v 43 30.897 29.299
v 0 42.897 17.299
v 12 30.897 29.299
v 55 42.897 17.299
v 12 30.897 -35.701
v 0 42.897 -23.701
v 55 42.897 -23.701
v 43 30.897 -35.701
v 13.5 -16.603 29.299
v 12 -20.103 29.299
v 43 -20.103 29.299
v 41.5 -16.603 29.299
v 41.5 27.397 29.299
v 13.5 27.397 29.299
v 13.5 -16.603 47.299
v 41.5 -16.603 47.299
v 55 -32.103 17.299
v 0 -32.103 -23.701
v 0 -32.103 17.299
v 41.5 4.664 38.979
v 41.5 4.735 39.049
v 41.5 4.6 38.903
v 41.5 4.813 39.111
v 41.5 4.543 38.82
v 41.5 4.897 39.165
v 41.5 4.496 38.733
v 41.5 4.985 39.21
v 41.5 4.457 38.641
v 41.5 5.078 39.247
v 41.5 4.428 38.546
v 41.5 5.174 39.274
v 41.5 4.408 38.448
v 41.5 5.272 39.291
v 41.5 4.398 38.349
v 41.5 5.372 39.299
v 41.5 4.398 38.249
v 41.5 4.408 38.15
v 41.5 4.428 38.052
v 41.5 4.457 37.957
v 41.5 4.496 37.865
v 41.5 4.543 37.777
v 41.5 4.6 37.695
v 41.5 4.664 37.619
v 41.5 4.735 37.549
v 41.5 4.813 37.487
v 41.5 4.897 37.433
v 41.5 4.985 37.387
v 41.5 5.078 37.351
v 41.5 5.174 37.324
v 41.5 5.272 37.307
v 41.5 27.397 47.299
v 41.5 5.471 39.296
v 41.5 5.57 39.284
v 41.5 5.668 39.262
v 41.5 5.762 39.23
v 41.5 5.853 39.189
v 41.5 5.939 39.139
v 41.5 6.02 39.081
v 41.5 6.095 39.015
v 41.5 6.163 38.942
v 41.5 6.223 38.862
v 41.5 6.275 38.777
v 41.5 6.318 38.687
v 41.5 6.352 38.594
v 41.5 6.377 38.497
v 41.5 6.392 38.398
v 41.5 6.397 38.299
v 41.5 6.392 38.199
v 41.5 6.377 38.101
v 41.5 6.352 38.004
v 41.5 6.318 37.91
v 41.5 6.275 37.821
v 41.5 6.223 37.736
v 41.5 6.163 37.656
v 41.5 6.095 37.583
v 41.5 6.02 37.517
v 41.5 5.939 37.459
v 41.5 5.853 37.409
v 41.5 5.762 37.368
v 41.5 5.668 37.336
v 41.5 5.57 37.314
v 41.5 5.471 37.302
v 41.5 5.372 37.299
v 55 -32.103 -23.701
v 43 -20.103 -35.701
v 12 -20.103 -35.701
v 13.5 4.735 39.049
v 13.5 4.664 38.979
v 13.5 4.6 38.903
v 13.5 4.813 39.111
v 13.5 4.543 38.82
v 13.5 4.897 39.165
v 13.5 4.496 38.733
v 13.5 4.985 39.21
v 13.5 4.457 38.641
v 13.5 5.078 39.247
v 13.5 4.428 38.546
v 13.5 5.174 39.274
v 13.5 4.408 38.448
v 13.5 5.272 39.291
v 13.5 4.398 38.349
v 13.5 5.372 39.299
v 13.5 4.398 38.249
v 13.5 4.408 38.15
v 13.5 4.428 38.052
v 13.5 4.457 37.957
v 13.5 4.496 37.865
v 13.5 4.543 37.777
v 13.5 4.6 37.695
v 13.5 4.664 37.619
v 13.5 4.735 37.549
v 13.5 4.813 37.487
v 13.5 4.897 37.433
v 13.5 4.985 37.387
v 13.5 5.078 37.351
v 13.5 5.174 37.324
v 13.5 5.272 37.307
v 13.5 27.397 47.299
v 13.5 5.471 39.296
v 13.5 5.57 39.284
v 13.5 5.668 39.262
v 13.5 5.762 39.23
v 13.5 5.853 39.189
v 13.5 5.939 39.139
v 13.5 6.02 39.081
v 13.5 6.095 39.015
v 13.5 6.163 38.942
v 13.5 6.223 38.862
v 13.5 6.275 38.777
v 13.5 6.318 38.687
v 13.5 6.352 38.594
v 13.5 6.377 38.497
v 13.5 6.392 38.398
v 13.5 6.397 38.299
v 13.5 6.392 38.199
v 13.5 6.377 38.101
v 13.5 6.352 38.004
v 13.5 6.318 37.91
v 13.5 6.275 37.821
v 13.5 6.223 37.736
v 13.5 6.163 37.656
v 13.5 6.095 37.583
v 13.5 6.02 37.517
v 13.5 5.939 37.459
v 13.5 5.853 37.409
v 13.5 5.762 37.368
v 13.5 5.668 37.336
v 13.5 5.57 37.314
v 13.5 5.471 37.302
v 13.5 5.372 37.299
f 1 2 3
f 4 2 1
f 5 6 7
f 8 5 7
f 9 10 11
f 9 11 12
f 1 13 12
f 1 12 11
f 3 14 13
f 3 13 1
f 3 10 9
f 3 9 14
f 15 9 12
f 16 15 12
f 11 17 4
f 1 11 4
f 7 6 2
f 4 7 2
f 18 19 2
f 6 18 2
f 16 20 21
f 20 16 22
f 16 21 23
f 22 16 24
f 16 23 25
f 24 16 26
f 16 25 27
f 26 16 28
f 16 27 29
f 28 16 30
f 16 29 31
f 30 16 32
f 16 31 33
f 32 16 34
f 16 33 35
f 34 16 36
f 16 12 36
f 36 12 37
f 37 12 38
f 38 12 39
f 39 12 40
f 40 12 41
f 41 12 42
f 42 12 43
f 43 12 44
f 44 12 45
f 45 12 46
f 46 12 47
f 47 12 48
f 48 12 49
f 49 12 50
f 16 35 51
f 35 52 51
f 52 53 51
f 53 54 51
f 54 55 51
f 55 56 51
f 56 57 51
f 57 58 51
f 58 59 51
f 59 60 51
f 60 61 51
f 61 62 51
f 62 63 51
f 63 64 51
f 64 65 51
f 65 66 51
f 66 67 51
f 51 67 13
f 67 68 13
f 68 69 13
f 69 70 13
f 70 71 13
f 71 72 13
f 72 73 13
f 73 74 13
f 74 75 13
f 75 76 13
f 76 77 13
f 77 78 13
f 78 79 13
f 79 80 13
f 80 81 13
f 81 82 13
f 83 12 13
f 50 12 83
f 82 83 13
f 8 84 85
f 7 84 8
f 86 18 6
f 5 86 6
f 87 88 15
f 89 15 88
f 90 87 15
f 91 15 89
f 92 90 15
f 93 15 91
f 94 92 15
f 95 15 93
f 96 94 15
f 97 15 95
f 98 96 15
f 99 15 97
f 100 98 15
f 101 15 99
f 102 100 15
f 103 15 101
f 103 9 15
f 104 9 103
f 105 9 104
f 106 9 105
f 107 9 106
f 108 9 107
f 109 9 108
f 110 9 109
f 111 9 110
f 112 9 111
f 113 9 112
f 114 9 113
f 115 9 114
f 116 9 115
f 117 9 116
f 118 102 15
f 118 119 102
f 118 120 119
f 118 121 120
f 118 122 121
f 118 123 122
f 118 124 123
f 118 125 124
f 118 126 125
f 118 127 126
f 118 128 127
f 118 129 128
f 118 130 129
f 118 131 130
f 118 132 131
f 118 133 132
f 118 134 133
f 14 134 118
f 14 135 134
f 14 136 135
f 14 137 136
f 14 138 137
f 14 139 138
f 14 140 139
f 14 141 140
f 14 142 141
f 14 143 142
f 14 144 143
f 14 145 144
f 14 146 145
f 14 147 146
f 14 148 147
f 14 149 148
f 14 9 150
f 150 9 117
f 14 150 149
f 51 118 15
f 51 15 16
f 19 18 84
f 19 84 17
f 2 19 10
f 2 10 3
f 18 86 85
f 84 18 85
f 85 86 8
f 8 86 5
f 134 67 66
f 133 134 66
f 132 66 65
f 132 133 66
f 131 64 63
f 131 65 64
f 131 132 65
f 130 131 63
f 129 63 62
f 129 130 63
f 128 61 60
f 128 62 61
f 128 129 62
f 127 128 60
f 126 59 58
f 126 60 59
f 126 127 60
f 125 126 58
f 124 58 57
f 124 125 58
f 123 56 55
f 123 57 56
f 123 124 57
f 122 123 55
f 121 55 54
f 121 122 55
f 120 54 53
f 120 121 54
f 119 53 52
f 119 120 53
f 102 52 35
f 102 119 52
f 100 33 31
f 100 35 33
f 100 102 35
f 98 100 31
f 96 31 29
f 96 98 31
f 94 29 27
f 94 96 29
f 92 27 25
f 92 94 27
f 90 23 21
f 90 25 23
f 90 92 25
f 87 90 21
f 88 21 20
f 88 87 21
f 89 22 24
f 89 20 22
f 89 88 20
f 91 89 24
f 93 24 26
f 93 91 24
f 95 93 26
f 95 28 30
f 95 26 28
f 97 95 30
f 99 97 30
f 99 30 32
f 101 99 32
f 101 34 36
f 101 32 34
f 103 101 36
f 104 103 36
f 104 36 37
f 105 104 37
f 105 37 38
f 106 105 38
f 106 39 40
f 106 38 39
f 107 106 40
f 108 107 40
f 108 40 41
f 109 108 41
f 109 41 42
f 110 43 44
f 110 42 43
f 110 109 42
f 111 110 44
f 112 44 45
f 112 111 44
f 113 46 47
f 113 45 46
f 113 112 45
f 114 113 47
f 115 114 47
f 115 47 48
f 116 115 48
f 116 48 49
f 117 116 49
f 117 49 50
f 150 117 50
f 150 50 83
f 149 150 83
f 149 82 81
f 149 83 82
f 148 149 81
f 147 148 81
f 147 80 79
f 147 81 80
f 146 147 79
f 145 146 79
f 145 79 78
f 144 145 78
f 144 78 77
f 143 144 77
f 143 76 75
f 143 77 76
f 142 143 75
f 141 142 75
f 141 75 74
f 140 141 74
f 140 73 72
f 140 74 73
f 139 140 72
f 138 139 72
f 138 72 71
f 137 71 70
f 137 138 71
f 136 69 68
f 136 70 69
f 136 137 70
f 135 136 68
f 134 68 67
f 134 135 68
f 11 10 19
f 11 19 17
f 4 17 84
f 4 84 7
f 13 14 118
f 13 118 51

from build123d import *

# Parameters (mm, degrees)
SKETCH1_W               = 75
SKETCH1_H               = 65
BOSS_EXTRUDE1_DEPTH     = 55
SKETCH2_W               = 28
SKETCH2_H               = 44
BOSS_EXTRUDE2_DEPTH     = 18
CHAMFER1_SIZE           = 12
CUT_EXTRUDE1_DEPTH      = 77.154844523
CUT_EXTRUDE1_DEPTH_BACK = 77.154844523
SKETCH3_R               = 1


with BuildPart() as part:
    # Sketch1 → Boss-Extrude1 (new body)
    with BuildSketch(Plane.YZ):
        with Locations((5.396678967, -3.201107011)):
            Rectangle(SKETCH1_W, SKETCH1_H)
    extrude(amount=BOSS_EXTRUDE1_DEPTH)

    # Sketch2 → Boss-Extrude2 (add)
    with BuildSketch(Plane.XY.offset(29.298892989)):
        with Locations((27.5, 5.396678967)):
            Rectangle(SKETCH2_W, SKETCH2_H)
    extrude(amount=BOSS_EXTRUDE2_DEPTH)

    # Chamfer1
    chamfer1_edges = [part.edges().sort_by_distance(p)[0] for p in [
        (55, 5.396678967, 29.298892989),
        (0, 5.396678967, 29.298892989),
        (0, 5.396678967, -35.701107011),
        (27.5, -32.103321033, 29.298892989),
        (27.5, 42.896678967, 29.298892989),
        (27.5, 42.896678967, -35.701107011),
        (27.5, -32.103321033, -35.701107011),
        (55, 5.396678967, -35.701107011),
    ]]
    chamfer(chamfer1_edges, length=CHAMFER1_SIZE)

    # Sketch3 → Cut-Extrude1 (cut, two sides: drawn at the far end of the back side and taken through both)
    with BuildSketch(Plane.YZ.offset(41.5).offset(-CUT_EXTRUDE1_DEPTH_BACK)):
        with Locations((5.396678967, 38.298892989)):
            Circle(SKETCH3_R)
    extrude(amount=CUT_EXTRUDE1_DEPTH + CUT_EXTRUDE1_DEPTH_BACK, mode=Mode.SUBTRACT)


solid = part.part
